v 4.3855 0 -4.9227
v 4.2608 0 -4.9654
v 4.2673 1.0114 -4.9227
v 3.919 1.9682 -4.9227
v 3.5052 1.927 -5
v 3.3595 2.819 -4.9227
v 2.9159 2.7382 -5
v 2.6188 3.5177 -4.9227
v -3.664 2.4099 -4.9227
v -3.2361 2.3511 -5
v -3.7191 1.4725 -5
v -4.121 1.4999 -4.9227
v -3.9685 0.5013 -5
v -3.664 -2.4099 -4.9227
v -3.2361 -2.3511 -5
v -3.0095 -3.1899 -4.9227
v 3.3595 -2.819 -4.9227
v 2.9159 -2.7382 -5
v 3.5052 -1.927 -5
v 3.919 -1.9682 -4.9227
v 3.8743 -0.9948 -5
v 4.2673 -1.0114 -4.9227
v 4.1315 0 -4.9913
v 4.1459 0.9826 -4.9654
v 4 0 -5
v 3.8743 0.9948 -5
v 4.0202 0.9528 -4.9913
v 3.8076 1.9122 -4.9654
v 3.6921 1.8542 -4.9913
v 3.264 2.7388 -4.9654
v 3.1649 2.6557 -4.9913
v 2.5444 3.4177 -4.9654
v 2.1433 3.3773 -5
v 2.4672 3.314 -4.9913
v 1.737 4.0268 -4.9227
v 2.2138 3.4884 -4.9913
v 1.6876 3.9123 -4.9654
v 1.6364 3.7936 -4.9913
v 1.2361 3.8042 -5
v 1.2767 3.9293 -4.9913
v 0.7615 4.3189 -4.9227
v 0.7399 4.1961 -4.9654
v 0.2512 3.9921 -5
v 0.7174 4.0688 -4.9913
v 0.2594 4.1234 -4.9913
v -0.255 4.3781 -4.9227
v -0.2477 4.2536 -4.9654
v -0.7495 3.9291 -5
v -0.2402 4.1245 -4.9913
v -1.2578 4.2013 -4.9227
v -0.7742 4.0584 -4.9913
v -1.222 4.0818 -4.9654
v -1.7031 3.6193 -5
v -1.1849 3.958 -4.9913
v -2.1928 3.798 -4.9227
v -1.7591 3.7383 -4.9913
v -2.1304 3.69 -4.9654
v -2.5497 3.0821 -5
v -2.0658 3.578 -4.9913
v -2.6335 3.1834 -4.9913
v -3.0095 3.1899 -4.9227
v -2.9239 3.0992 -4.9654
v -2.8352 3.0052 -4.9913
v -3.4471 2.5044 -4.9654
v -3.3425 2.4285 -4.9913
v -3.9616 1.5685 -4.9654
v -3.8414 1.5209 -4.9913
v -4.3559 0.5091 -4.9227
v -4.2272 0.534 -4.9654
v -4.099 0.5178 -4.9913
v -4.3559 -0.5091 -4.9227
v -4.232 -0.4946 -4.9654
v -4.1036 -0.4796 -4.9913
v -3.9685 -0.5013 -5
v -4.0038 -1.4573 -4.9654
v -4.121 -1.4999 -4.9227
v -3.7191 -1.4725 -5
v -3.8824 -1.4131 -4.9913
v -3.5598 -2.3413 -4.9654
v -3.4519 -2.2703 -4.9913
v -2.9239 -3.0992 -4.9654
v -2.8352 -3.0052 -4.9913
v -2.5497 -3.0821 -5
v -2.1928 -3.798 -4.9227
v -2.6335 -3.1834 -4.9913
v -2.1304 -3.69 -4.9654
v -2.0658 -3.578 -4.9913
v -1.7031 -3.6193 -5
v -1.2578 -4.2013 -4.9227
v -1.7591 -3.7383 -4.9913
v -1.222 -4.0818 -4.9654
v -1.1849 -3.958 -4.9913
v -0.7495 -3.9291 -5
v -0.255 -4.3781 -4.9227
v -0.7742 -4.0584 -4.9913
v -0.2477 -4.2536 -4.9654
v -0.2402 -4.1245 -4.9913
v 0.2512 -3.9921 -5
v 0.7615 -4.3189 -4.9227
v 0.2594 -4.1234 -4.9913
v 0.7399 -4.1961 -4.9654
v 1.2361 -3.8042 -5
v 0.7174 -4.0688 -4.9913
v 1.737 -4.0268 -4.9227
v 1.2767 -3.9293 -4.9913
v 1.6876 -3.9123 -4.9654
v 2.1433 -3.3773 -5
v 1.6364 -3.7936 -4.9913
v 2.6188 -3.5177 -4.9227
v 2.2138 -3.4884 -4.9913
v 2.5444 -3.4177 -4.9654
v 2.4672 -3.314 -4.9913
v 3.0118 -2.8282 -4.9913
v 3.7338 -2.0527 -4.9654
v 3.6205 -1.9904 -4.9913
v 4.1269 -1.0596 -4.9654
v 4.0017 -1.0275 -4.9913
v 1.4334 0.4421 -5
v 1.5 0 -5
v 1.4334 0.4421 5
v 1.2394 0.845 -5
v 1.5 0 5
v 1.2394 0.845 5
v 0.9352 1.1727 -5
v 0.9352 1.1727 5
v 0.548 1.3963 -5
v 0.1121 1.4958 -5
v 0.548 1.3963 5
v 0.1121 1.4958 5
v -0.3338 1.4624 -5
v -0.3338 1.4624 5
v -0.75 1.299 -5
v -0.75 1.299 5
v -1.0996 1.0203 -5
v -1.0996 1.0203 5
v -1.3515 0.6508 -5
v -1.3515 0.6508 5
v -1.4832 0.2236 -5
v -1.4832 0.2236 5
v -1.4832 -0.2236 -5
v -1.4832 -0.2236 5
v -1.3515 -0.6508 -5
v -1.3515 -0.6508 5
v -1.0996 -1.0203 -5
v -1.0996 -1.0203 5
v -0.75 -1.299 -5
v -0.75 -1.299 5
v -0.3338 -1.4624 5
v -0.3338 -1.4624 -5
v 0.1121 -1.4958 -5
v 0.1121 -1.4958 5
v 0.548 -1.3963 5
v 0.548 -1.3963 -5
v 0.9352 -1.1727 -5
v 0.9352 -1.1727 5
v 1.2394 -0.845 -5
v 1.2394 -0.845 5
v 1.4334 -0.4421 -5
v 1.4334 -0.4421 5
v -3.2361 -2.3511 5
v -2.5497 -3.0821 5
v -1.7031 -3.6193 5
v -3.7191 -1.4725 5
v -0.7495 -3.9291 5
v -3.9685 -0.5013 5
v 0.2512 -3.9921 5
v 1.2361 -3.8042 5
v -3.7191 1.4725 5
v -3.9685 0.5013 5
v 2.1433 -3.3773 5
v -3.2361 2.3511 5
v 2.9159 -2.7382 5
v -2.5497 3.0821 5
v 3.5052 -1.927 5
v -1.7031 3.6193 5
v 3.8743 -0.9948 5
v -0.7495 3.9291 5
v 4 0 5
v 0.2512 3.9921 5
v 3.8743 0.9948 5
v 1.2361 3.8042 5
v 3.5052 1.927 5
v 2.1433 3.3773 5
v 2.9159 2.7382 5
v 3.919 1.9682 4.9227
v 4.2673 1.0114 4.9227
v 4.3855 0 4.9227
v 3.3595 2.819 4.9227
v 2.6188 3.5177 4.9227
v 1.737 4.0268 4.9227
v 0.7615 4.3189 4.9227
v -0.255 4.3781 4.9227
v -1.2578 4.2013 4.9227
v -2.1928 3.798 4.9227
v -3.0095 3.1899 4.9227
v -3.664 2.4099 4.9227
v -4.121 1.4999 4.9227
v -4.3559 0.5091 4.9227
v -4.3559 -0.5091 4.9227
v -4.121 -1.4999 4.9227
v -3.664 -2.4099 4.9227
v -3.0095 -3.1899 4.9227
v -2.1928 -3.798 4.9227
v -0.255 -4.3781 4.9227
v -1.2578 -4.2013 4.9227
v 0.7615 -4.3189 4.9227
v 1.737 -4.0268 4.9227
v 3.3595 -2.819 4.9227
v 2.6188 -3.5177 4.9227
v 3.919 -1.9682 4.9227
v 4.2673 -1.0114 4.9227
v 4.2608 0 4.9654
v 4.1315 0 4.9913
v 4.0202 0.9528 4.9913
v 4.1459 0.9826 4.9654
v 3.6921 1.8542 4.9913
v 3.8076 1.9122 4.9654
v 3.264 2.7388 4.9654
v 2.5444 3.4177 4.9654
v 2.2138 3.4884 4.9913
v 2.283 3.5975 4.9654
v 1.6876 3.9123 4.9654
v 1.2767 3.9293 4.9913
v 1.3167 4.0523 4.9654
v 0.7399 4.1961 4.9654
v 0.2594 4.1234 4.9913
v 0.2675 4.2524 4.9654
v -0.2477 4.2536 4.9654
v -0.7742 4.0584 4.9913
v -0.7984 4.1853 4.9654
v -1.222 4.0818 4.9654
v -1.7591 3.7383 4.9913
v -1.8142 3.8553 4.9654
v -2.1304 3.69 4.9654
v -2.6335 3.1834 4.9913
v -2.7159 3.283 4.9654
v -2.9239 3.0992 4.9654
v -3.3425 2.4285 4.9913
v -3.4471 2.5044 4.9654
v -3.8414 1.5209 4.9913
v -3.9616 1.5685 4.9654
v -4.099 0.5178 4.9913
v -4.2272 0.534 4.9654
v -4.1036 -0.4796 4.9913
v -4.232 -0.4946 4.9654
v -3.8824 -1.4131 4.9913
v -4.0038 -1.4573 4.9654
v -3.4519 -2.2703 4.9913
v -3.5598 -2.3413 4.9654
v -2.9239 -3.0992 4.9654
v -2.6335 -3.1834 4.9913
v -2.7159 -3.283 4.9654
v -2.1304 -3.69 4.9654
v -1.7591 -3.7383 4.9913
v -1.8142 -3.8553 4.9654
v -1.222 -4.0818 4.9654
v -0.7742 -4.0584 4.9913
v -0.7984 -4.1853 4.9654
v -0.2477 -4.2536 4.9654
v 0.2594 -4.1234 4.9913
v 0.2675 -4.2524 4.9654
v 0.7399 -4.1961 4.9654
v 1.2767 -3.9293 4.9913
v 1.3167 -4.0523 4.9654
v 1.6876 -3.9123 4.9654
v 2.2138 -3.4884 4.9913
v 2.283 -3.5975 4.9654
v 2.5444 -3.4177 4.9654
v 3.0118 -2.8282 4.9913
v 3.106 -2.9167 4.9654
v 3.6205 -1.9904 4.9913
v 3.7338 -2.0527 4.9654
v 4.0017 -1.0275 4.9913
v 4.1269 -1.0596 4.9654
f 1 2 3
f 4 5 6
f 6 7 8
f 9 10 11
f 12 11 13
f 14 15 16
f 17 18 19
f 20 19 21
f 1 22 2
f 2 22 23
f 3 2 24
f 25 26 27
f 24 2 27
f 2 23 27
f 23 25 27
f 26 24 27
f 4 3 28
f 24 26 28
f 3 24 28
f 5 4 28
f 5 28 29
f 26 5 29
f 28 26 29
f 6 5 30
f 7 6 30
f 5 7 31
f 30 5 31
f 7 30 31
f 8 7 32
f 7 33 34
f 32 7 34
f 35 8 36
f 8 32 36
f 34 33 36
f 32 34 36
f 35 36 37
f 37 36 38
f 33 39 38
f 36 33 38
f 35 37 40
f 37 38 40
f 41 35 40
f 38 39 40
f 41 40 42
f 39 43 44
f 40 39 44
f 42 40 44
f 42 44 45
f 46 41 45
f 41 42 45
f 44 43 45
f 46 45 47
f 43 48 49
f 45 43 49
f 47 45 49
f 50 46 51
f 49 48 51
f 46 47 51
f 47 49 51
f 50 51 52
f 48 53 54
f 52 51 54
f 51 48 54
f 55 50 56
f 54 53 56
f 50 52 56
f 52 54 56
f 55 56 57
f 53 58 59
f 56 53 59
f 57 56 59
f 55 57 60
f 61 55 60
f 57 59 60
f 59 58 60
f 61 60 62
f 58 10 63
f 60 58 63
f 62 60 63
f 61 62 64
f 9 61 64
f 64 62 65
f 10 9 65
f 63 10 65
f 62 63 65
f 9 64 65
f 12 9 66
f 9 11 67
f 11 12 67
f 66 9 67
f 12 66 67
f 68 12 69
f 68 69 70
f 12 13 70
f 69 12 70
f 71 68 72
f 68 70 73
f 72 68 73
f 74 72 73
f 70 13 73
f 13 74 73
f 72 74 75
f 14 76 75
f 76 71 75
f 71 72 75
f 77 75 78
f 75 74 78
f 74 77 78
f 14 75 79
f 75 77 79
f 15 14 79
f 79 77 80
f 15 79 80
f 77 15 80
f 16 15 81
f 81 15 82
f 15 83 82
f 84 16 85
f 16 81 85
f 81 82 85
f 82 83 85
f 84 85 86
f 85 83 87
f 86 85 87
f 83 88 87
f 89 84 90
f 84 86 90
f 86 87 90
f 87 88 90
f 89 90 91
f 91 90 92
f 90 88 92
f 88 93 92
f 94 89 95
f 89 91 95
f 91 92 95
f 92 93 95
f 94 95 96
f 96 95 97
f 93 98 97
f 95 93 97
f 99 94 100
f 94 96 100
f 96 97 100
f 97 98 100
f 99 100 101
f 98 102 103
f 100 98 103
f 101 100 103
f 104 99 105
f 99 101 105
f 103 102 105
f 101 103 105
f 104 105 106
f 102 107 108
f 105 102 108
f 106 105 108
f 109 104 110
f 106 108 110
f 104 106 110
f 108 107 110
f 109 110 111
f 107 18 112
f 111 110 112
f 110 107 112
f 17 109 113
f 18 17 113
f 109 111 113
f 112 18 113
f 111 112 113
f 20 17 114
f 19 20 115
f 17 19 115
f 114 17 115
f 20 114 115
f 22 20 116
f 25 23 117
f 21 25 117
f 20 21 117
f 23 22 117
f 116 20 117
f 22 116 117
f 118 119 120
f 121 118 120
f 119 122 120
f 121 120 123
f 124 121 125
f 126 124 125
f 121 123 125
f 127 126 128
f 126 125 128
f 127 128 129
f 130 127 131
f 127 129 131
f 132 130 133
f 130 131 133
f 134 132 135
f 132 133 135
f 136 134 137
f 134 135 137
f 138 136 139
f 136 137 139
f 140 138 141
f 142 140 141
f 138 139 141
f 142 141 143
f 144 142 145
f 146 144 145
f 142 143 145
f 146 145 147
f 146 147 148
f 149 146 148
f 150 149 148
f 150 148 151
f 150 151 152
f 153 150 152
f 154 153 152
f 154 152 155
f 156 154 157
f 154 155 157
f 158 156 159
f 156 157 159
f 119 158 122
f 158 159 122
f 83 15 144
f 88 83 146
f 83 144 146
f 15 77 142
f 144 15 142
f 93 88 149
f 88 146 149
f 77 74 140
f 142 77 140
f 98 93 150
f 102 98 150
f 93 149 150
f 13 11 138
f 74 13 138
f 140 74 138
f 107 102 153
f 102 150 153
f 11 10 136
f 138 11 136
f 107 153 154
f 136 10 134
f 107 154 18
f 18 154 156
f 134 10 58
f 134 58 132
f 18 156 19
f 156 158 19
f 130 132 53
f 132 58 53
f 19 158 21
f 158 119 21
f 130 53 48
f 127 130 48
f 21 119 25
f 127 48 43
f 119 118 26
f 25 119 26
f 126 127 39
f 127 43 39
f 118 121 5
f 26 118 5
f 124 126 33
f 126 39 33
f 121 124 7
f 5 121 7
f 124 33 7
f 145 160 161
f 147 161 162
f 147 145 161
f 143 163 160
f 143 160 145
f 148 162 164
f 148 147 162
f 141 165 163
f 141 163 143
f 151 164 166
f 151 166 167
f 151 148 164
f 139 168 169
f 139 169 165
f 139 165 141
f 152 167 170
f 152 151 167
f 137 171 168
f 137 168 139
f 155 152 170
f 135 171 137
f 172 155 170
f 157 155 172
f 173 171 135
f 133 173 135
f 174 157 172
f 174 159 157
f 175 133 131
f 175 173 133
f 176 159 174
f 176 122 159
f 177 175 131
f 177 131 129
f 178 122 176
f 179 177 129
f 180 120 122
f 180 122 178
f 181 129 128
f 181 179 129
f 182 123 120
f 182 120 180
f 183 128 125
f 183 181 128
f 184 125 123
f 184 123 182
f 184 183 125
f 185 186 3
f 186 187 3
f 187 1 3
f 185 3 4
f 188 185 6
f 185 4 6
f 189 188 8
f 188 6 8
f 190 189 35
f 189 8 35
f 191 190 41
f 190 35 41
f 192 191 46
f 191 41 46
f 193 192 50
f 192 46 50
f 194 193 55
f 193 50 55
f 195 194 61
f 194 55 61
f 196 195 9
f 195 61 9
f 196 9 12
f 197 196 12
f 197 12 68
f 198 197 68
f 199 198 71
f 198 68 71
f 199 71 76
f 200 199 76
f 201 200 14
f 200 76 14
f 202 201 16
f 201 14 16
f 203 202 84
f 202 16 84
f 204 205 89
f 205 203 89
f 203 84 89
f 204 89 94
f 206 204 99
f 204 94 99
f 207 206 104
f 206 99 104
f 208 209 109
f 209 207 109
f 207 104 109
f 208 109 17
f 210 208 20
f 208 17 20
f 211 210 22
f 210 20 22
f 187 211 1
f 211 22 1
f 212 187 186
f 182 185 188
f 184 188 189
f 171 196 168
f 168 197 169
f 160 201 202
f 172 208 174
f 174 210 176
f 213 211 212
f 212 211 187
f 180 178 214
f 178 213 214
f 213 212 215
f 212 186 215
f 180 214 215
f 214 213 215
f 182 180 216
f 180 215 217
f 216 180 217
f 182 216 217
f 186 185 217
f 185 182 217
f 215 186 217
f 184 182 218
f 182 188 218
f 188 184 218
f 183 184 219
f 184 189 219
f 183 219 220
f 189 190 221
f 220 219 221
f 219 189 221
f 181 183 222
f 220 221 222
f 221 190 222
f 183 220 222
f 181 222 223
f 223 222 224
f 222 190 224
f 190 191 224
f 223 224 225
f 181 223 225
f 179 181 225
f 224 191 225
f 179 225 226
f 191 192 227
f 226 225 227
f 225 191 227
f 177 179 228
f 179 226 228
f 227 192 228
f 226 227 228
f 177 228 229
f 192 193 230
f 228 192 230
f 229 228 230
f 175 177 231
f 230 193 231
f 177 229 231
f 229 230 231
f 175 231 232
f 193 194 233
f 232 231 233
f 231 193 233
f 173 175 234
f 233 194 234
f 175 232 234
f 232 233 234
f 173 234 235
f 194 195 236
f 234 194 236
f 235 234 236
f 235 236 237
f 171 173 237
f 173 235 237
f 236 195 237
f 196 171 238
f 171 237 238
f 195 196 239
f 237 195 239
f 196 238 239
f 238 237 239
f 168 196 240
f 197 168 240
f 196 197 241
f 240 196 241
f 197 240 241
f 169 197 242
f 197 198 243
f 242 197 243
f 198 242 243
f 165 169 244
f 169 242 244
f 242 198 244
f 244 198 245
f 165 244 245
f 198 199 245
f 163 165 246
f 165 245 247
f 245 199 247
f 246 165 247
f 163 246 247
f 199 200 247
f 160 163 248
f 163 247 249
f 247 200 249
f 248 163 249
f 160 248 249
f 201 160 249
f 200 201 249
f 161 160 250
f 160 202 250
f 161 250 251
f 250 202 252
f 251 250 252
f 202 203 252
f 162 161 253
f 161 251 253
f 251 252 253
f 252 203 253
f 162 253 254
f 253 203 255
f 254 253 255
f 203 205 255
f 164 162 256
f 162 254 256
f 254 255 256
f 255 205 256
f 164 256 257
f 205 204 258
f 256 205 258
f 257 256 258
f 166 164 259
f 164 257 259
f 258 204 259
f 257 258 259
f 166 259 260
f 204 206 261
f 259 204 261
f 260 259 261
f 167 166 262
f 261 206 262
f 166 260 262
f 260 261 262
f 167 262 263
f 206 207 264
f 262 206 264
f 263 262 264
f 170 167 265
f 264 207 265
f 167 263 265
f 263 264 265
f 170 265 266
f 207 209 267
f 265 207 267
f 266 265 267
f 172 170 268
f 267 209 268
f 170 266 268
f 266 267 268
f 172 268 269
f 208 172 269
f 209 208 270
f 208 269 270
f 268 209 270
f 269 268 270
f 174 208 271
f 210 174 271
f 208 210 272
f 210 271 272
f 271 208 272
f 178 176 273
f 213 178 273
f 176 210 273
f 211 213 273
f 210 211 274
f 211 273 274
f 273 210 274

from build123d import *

# Parameters (mm, degrees)
F0_R      = 40
F0_R_2    = 35
F1_DEPTH  = 5
F2_R      = 4.99999
F3_DEPTH  = 2.5
F4_R      = 5
F5_DEPTH  = 5
F6_R      = 1.5
F7_DEPTH  = 5
F9_DEPTH  = 2.5
F10_R     = 1
F11_R     = 44.5515786246
F11_R_2   = 4.3855137127
F12_DEPTH = 6


# Not quite as in the source:
# - a fillet or chamfer is up to 0.001 mm smaller than in the source, because OpenCascade refuses the exact size


with BuildPart() as f1:
    # F0 (on Top) → F1 (new body, symmetric)
    with BuildSketch(Plane.XY):
        Circle(F0_R)
        Circle(F0_R_2, mode=Mode.SUBTRACT)
    extrude(amount=F1_DEPTH, both=True)

    # F2 (radius 5 in the source; OpenCascade refuses exactly that, so slightly less here)
    f2_edges = [f1.edges().sort_by_distance(p)[0] for p in [
        (-40, 0, 5),
        (-40, 0, -5),
    ]]
    fillet(f2_edges, radius=F2_R)

    # F0 (on Top) → F3 (join, symmetric)
    with BuildSketch(Plane.XY):
        Circle(F0_R_2)
    extrude(amount=F3_DEPTH, both=True)

    # F4 (on Top) → F5 (join, symmetric)
    with BuildSketch(Plane.XY):
        Circle(F4_R)
    extrude(amount=F5_DEPTH, both=True)

    # F6 (on Top) → F7 (cut, symmetric)
    with BuildSketch(Plane.XY):
        Circle(F6_R)
    extrude(amount=F7_DEPTH, both=True, mode=Mode.SUBTRACT)

    # F8 (on Top) → F9 (cut, symmetric)
    with BuildSketch(Plane.XY):
        with BuildLine():
            ThreePointArc((-30.0140328654, 11.8585631023), (-31.0869388877, 8.7208064041), (-31.7860568579, 5.4792206049))
            ThreePointArc((-31.7860568579, 5.4792206049), (-31.3779575205, 3.9314640765), (-29.9653471981, 3.1787174941))
            Line((-29.9653471981, 3.1787174941), (-8.8751398211, 1.5323311534))
            ThreePointArc((-8.8751398211, 1.5323311534), (-7.8337940647, 2.2616563361), (-8.3497989023, 3.4235751))
            Line((-8.3497989023, 3.4235751), (-27.2676686416, 12.89044574))
            ThreePointArc((-27.2676686416, 12.89044574), (-28.866135701, 12.9741021828), (-30.0140328654, 11.8585631023))
        make_face()
        with BuildLine():
            ThreePointArc((-30.3900590314, -11.1791820248), (-29.2627563738, -12.3155288285), (-27.6630266578, -12.2611213303))
            Line((-27.6630266578, -12.2611213303), (-8.5751781278, -3.1418300373))
            ThreePointArc((-8.5751781278, -3.1418300373), (-8.03800884, -1.9895430233), (-9.0658415198, -1.2412942754))
            Line((-9.0658415198, -1.2412942754), (-30.1826326195, -2.5016786765))
            ThreePointArc((-30.1826326195, -2.5016786765), (-31.6087739214, -3.2284636015), (-32.0451124866, -4.7684973663))
            ThreePointArc((-32.0451124866, -4.7684973663), (-31.4053980086, -8.022327389), (-30.3900590314, -11.1791820248))
        make_face()
        with BuildLine():
            ThreePointArc((-20.8518881352, -24.9077829753), (-19.3074419941, -25.328236846), (-17.9492391699, -24.4812537124))
            Line((-17.9492391699, -24.4812537124), (-5.978323086, -7.0397915232))
            ThreePointArc((-5.978323086, -7.0397915232), (-6.0892643436, -5.7732970527), (-7.3535179291, -5.6392109685))
            Line((-7.3535179291, -5.6392109685), (-25.0110032673, -17.2891314283))
            ThreePointArc((-25.0110032673, -17.2891314283), (-25.8826854016, -18.6316162874), (-25.4905488012, -20.183493933))
            ThreePointArc((-25.4905488012, -20.183493933), (-23.3096248008, -22.6815361533), (-20.8518881352, -24.9077829753))
        make_face()
        with BuildLine():
            ThreePointArc((-5.7272893582, -32.0280147088), (-4.1795328299, -31.6199153714), (-3.4267862475, -30.207305049))
            Line((-3.4267862475, -30.207305049), (-1.7803999068, -9.117097672))
            ThreePointArc((-1.7803999068, -9.117097672), (-2.5097250895, -8.0757519156), (-3.6716438534, -8.5917567532))
            Line((-3.6716438534, -8.5917567532), (-13.1385144934, -27.5096264925))
            ThreePointArc((-13.1385144934, -27.5096264925), (-13.2221709361, -29.1080935518), (-12.1066318557, -30.2559907163))
            ThreePointArc((-12.1066318557, -30.2559907163), (-8.9688751575, -31.3288967386), (-5.7272893582, -32.0280147088))
        make_face()
        with BuildLine():
            ThreePointArc((10.9311132714, -30.6320168823), (12.0674600751, -29.5047142247), (12.0130525769, -27.9049845086))
            Line((12.0130525769, -27.9049845086), (2.8937612839, -8.8171359787))
            ThreePointArc((2.8937612839, -8.8171359787), (1.7414742699, -8.2799666909), (0.993225522, -9.3077993707))
            Line((0.993225522, -9.3077993707), (2.2536099231, -30.4245904704))
            ThreePointArc((2.2536099231, -30.4245904704), (2.9803948481, -31.8507317723), (4.5204286129, -32.2870703374))
            ThreePointArc((4.5204286129, -32.2870703374), (7.7742586356, -31.6473558595), (10.9311132714, -30.6320168823))
        make_face()
        with BuildLine():
            ThreePointArc((24.6597142219, -21.0938459861), (25.0801680926, -19.549399845), (24.233184959, -18.1911970208))
            Line((24.233184959, -18.1911970208), (6.7917227698, -6.2202809368))
            ThreePointArc((6.7917227698, -6.2202809368), (5.5252282993, -6.3312221945), (5.3911422152, -7.5954757799))
            Line((5.3911422152, -7.5954757799), (17.0410626749, -25.2529611182))
            ThreePointArc((17.0410626749, -25.2529611182), (18.383547534, -26.1246432525), (19.9354251796, -25.7325066521))
            ThreePointArc((19.9354251796, -25.7325066521), (22.4334673999, -23.5515826517), (24.6597142219, -21.0938459861))
        make_face()
        with BuildLine():
            ThreePointArc((31.7799459554, -5.9692472091), (31.371846618, -4.4214906808), (29.9592362956, -3.6687440984))
            Line((29.9592362956, -3.6687440984), (8.8690289186, -2.0223577577))
            ThreePointArc((8.8690289186, -2.0223577577), (7.8276831622, -2.7516829403), (8.3436879998, -3.9136017043))
            Line((8.3436879998, -3.9136017043), (27.2615577391, -13.3804723443))
            ThreePointArc((27.2615577391, -13.3804723443), (28.8600247985, -13.464128787), (30.0079219629, -12.3485897066))
            ThreePointArc((30.0079219629, -12.3485897066), (31.0808279852, -9.2108330083), (31.7799459554, -5.9692472091))
        make_face()
        with BuildLine():
            ThreePointArc((30.3839481289, 10.6891554205), (29.2566454713, 11.8255022243), (27.6569157553, 11.7710947261))
            Line((27.6569157553, 11.7710947261), (8.5690672253, 2.651803433))
            ThreePointArc((8.5690672253, 2.651803433), (8.0318979375, 1.499516419), (9.0597306173, 0.7512676711))
            Line((9.0597306173, 0.7512676711), (30.176521717, 2.0116520722))
            ThreePointArc((30.176521717, 2.0116520722), (31.6026630189, 2.7384369973), (32.0390015841, 4.2784707621))
            ThreePointArc((32.0390015841, 4.2784707621), (31.3992871061, 7.5323007848), (30.3839481289, 10.6891554205))
        make_face()
        with BuildLine():
            ThreePointArc((20.8457772327, 24.417756371), (19.3013310916, 24.8382102418), (17.9431282674, 23.9912271081))
            Line((17.9431282674, 23.9912271081), (5.9722121835, 6.5497649189))
            ThreePointArc((5.9722121835, 6.5497649189), (6.0831534411, 5.2832704484), (7.3474070266, 5.1491843643))
            Line((7.3474070266, 5.1491843643), (25.0048923648, 16.799104824))
            ThreePointArc((25.0048923648, 16.799104824), (25.8765744991, 18.1415896832), (25.4844378987, 19.6934673287))
            ThreePointArc((25.4844378987, 19.6934673287), (23.3035138983, 22.191509549), (20.8457772327, 24.417756371))
        make_face()
        with BuildLine():
            ThreePointArc((5.7211784557, 31.5379881045), (4.1734219274, 31.1298887671), (3.420675345, 29.7172784447))
            Line((3.420675345, 29.7172784447), (1.7742890043, 8.6270710677))
            ThreePointArc((1.7742890043, 8.6270710677), (2.503614187, 7.5857253113), (3.6655329509, 8.1017301489))
            Line((3.6655329509, 8.1017301489), (13.1324035909, 27.0195998883))
            ThreePointArc((13.1324035909, 27.0195998883), (13.2160600336, 28.6180669476), (12.1005209532, 29.7659641121))
            ThreePointArc((12.1005209532, 29.7659641121), (8.9627642549, 30.8388701343), (5.7211784557, 31.5379881045))
        make_face()
        with BuildLine():
            ThreePointArc((-10.9372241739, 30.141990278), (-12.0735709776, 29.0146876204), (-12.0191634794, 27.4149579044))
            Line((-12.0191634794, 27.4149579044), (-2.8998721864, 8.3271093745))
            ThreePointArc((-2.8998721864, 8.3271093745), (-1.7475851724, 7.7899400866), (-0.9993364245, 8.8177727664))
            Line((-0.9993364245, 8.8177727664), (-2.2597208256, 29.9345638662))
            ThreePointArc((-2.2597208256, 29.9345638662), (-2.9865057506, 31.360705168), (-4.5265395155, 31.7970437332))
            ThreePointArc((-4.5265395155, 31.7970437332), (-7.7803695381, 31.1573292552), (-10.9372241739, 30.141990278))
        make_face()
        with BuildLine():
            ThreePointArc((-24.6658251244, 20.6038193818), (-25.0862789951, 19.0593732407), (-24.2392958615, 17.7011704166))
            Line((-24.2392958615, 17.7011704166), (-6.7978336723, 5.7302543326))
            ThreePointArc((-6.7978336723, 5.7302543326), (-5.5313392018, 5.8411955902), (-5.3972531177, 7.1054491757))
            Line((-5.3972531177, 7.1054491757), (-17.0471735774, 24.7629345139))
            ThreePointArc((-17.0471735774, 24.7629345139), (-18.3896584365, 25.6346166482), (-19.9415360821, 25.2424800479))
            ThreePointArc((-19.9415360821, 25.2424800479), (-22.4395783024, 23.0615560474), (-24.6658251244, 20.6038193818))
        make_face()
    extrude(amount=F9_DEPTH, both=True, mode=Mode.SUBTRACT)

    # F10
    f10_edges = [f1.edges().sort_by_distance(p)[0] for p in [
        (-19.420244, 2.355524, 2.5),
        (-17.808734, 8.15701, 2.5),
        (-35, 0, -2.5),
        (23.303514, 22.19151, -2.5),
        (7.774259, -31.647356, -2.5),
        (15.512454, -12.205739, -2.5),
        (11.216102, -16.424218, -2.5),
        (25.080168, -19.5494, -2.5),
        (17.802623, -8.647037, -2.5),
        (-8.405079, -18.050692, -2.5),
        (-8.968875, -31.328897, -2.5),
        (7.453407, -18.36106, -2.5),
        (-25.086279, 19.059373, -2.5),
        (-12.073571, 29.014688, -2.5),
        (-23.309625, -22.681536, -2.5),
        (-16.182261, -11.464171, -2.5),
        (-31.086939, 8.720806, -2.5),
        (-11.963781, -15.760523, -2.5),
        (-29.262756, -12.315529, -2.5),
        (-31.405398, -8.022327, -2.5),
        (-18.119102, -7.701476, -2.5),
        (-22.439578, 23.061556, -2.5),
        (-17.808734, 8.15701, -2.5),
        (-11.222213, 15.934192, -2.5),
        (8.962764, 30.83887, -2.5),
        (16.17615, 10.974145, -2.5),
        (31.080828, -9.210833, -2.5),
        (18.383548, -26.124643, -2.5),
        (18.112991, 7.211449, -2.5),
        (31.399287, 7.532301, -2.5),
        (11.95767, 15.270496, -2.5),
        (2.503614, 7.585725, -2.5),
        (-7.78037, 31.157329, -2.5),
        (22.433467, -23.551583, -2.5),
        (-2.986506, 31.360705, -2.5),
        (-13.222171, -29.108094, -2.5),
        (-7.459518, 17.871034, -2.5),
        (-25.882685, -18.631616, -2.5),
        (8.398968, 17.560665, -2.5),
        (-5, 0, -5),
        (16.17615, 10.974145, 2.5),
        (25.876574, 18.14159, -2.5),
        (-2.603593, -19.662201, -2.5),
        (1.623418, -19.866195, 2.5),
        (1.623418, -19.866195, -2.5),
        (7.774259, -31.647356, 2.5),
        (11.216102, -16.424218, 2.5),
        (31.371847, -4.421491, -2.5),
        (19.618126, 1.38146, -2.5),
        (29.256645, 11.825502, -2.5),
        (-8.405079, -18.050692, 2.5),
        (-19.941536, 25.24248, 0),
        (-35, 0, 2.5),
        (-8.968875, -31.328897, 2.5),
        (-4.179533, -31.619915, -2.5),
        (7.453407, -18.36106, 2.5),
        (-11.222213, 15.934192, 2.5),
        (-15.518565, 11.715712, -2.5),
        (-5.531339, 5.841196, -2.5),
        (-28.866136, 12.974102, -2.5),
        (-15.518565, 11.715712, 2.5),
        (-25.882685, -18.631616, 2.5),
        (24.233185, -18.191197, 0),
        (4.520429, -32.28707, 0),
        (-23.309625, -22.681536, 2.5),
        (10.931113, -30.632017, 0),
        (-16.182261, -11.464171, 2.5),
        (-6.089264, -5.773297, -2.5),
        (5.721178, 31.537988, 0),
        (-12.106632, -30.255991, 0),
        (-11.963781, -15.760523, 2.5),
        (-31.608774, -3.228464, -2.5),
        (20.845777, 24.417756, 0),
        (-31.405398, -8.022327, 2.5),
        (-19.624237, -1.871486, -2.5),
        (-8.038009, -1.989543, -2.5),
        (-31.086939, 8.720806, 2.5),
        (-25.086279, 19.059373, 2.5),
        (-18.389658, 25.634617, -2.5),
        (-22.439578, 23.061556, 2.5),
        (5.391142, -7.595476, 0),
        (17.041063, -25.252961, 0),
        (-31.377958, 3.931464, -2.5),
        (24.659714, -21.093846, 0),
        (19.935425, -25.732507, 0),
        (27.261558, -13.380472, 0),
        (-5, 0, 2.5),
        (-7.459518, 17.871034, 2.5),
        (-30.014033, 11.858563, 0),
        (4.173422, 31.129889, -2.5),
        (13.21606, 28.618067, -2.5),
        (8.962764, 30.83887, 2.5),
        (2.597482, 19.172175, -2.5),
        (-4.52654, 31.797044, 0),
        (19.301331, 24.83821, -2.5),
        (-10.937224, 30.14199, 0),
        (-2.259721, 29.934564, 0),
        (-12.019163, 27.414958, 0),
        (23.303514, 22.19151, 2.5),
        (3.665533, 8.10173, 0),
        (-27.663027, -12.261121, 0),
        (-30.390059, -11.179182, 0),
        (-25.011003, -17.289131, 0),
        (-20.851888, -24.907783, 0),
        (-25.490549, -20.183494, 0),
        (-3.671644, -8.591757, 0),
        (22.433467, -23.551583, 2.5),
        (2.893761, -8.817136, 0),
        (25.080168, -19.5494, 2.5),
        (-5, 0, -2.5),
        (19.414133, -2.845551, 2.5),
        (19.414133, -2.845551, -2.5),
        (18.383548, -26.124643, 2.5),
        (-2.509725, -8.075752, -2.5),
        (18.112991, 7.211449, 2.5),
        (6.083153, 5.28327, -2.5),
        (8.398968, 17.560665, 2.5),
        (17.802623, -8.647037, 2.5),
        (15.512454, -12.205739, 2.5),
        (31.080828, -9.210833, 2.5),
        (6.791723, -6.220281, 0),
        (1.741474, -8.279967, -2.5),
        (-7.833794, 2.261656, -2.5),
        (28.860025, -13.464129, -2.5),
        (11.95767, 15.270496, 2.5),
        (-1.747585, 7.78994, -2.5),
        (-7.78037, 31.157329, 2.5),
        (-27.267669, 12.890446, 0),
        (-19.307442, -25.328237, -2.5),
        (8.343688, -3.913602, 0),
        (19.618126, 1.38146, 2.5),
        (-13.138514, -27.509626, 0),
        (31.602663, 2.738437, -2.5),
        (12.06746, -29.504714, -2.5),
        (-18.119102, -7.701476, 2.5),
        (2.980395, -31.850732, -2.5),
        (-19.624237, -1.871486, 2.5),
        (7.827683, -2.751683, -2.5),
        (5.525228, -6.331222, -2.5),
        (-7.833794, 2.261656, 2.5),
        (1.741474, -8.279967, 2.5),
        (2.980395, -31.850732, 2.5),
        (12.06746, -29.504714, 2.5),
        (-19.307442, -25.328237, 2.5),
        (-2.603593, -19.662201, 2.5),
        (-2.509725, -8.075752, 2.5),
        (-8.87514, 1.532331, 0),
        (-13.222171, -29.108094, 2.5),
        (-4.179533, -31.619915, 2.5),
        (-31.786057, 5.479221, 0),
        (-8.349799, 3.423575, 0),
        (-5.531339, 5.841196, 2.5),
        (2.25361, -30.42459, 0),
        (-6.089264, -5.773297, 2.5),
        (12.013053, -27.904985, 0),
        (-29.262756, -12.315529, 2.5),
        (25.484438, 19.693467, 0),
        (-31.608774, -3.228464, 2.5),
        (32.039002, 4.278471, 0),
        (30.383948, 10.689155, 0),
        (-8.038009, -1.989543, 2.5),
        (9.059731, 0.751268, 0),
        (-28.866136, 12.974102, 2.5),
        (-18.389658, 25.634617, 2.5),
        (31.779946, -5.969247, 0),
        (30.007922, -12.34859, 0),
        (27.656916, 11.771095, 0),
        (4.173422, 31.129889, 2.5),
        (-6.797834, 5.730254, 0),
        (2.597482, 19.172175, 2.5),
        (19.301331, 24.83821, 2.5),
        (-19.420244, 2.355524, -2.5),
        (25.876574, 18.14159, 2.5),
        (-29.965347, 3.178717, 0),
        (6.083153, 5.28327, 2.5),
        (29.959236, -3.668744, 0),
        (-5.397253, 7.105449, 0),
        (2.503614, 7.585725, 2.5),
        (-8.575178, -3.14183, 0),
        (-9.065842, -1.241294, 0),
        (-30.182633, -2.501679, 0),
        (-32.045112, -4.768497, 0),
        (-17.949239, -24.481254, 0),
        (-5.978323, -7.039792, 0),
        (-7.353518, -5.639211, 0),
        (12.100521, 29.765964, 0),
        (-3.426786, -30.207305, 0),
        (-1.7804, -9.117098, 0),
        (30.176522, 2.011652, 0),
        (31.371847, -4.421491, 2.5),
        (25.004892, 16.799105, 0),
        (13.21606, 28.618067, 2.5),
        (-24.665825, 20.603819, 0),
        (17.943128, 23.991227, 0),
        (31.399287, 7.532301, 2.5),
        (8.869029, -2.022358, 0),
        (-5.727289, -32.028015, 0),
        (28.860025, -13.464129, 2.5),
        (29.256645, 11.825502, 2.5),
        (13.132404, 27.0196, 0),
        (5.525228, -6.331222, 2.5),
        (-1.629529, 19.376168, 2.5),
        (-1.629529, 19.376168, -2.5),
        (5.972212, 6.549765, 0),
        (1.774289, 8.627071, 0),
        (8.031898, 1.499516, 2.5),
        (8.031898, 1.499516, -2.5),
        (-2.986506, 31.360705, 2.5),
        (3.420675, 29.717278, 0),
        (-5, 0, 5),
        (7.347407, 5.149184, 0),
        (-12.073571, 29.014688, 2.5),
        (-31.377958, 3.931464, 2.5),
        (7.827683, -2.751683, 2.5),
        (-17.047174, 24.762935, 0),
        (0.993226, -9.307799, 0),
        (-24.239296, 17.70117, 0),
        (31.602663, 2.738437, 2.5),
        (-0.999336, 8.817773, 0),
        (-1.747585, 7.78994, 2.5),
        (-2.899872, 8.327109, 0),
        (8.569067, 2.651803, 0),
    ]]
    fillet(f10_edges, radius=F10_R)

    # F11 (on Top) → F12 (cut, symmetric)
    with BuildSketch(Plane.XY):
        Circle(F11_R)
        Circle(F11_R_2, mode=Mode.SUBTRACT)
    extrude(amount=F12_DEPTH, both=True, mode=Mode.SUBTRACT)


solid = f1.part
